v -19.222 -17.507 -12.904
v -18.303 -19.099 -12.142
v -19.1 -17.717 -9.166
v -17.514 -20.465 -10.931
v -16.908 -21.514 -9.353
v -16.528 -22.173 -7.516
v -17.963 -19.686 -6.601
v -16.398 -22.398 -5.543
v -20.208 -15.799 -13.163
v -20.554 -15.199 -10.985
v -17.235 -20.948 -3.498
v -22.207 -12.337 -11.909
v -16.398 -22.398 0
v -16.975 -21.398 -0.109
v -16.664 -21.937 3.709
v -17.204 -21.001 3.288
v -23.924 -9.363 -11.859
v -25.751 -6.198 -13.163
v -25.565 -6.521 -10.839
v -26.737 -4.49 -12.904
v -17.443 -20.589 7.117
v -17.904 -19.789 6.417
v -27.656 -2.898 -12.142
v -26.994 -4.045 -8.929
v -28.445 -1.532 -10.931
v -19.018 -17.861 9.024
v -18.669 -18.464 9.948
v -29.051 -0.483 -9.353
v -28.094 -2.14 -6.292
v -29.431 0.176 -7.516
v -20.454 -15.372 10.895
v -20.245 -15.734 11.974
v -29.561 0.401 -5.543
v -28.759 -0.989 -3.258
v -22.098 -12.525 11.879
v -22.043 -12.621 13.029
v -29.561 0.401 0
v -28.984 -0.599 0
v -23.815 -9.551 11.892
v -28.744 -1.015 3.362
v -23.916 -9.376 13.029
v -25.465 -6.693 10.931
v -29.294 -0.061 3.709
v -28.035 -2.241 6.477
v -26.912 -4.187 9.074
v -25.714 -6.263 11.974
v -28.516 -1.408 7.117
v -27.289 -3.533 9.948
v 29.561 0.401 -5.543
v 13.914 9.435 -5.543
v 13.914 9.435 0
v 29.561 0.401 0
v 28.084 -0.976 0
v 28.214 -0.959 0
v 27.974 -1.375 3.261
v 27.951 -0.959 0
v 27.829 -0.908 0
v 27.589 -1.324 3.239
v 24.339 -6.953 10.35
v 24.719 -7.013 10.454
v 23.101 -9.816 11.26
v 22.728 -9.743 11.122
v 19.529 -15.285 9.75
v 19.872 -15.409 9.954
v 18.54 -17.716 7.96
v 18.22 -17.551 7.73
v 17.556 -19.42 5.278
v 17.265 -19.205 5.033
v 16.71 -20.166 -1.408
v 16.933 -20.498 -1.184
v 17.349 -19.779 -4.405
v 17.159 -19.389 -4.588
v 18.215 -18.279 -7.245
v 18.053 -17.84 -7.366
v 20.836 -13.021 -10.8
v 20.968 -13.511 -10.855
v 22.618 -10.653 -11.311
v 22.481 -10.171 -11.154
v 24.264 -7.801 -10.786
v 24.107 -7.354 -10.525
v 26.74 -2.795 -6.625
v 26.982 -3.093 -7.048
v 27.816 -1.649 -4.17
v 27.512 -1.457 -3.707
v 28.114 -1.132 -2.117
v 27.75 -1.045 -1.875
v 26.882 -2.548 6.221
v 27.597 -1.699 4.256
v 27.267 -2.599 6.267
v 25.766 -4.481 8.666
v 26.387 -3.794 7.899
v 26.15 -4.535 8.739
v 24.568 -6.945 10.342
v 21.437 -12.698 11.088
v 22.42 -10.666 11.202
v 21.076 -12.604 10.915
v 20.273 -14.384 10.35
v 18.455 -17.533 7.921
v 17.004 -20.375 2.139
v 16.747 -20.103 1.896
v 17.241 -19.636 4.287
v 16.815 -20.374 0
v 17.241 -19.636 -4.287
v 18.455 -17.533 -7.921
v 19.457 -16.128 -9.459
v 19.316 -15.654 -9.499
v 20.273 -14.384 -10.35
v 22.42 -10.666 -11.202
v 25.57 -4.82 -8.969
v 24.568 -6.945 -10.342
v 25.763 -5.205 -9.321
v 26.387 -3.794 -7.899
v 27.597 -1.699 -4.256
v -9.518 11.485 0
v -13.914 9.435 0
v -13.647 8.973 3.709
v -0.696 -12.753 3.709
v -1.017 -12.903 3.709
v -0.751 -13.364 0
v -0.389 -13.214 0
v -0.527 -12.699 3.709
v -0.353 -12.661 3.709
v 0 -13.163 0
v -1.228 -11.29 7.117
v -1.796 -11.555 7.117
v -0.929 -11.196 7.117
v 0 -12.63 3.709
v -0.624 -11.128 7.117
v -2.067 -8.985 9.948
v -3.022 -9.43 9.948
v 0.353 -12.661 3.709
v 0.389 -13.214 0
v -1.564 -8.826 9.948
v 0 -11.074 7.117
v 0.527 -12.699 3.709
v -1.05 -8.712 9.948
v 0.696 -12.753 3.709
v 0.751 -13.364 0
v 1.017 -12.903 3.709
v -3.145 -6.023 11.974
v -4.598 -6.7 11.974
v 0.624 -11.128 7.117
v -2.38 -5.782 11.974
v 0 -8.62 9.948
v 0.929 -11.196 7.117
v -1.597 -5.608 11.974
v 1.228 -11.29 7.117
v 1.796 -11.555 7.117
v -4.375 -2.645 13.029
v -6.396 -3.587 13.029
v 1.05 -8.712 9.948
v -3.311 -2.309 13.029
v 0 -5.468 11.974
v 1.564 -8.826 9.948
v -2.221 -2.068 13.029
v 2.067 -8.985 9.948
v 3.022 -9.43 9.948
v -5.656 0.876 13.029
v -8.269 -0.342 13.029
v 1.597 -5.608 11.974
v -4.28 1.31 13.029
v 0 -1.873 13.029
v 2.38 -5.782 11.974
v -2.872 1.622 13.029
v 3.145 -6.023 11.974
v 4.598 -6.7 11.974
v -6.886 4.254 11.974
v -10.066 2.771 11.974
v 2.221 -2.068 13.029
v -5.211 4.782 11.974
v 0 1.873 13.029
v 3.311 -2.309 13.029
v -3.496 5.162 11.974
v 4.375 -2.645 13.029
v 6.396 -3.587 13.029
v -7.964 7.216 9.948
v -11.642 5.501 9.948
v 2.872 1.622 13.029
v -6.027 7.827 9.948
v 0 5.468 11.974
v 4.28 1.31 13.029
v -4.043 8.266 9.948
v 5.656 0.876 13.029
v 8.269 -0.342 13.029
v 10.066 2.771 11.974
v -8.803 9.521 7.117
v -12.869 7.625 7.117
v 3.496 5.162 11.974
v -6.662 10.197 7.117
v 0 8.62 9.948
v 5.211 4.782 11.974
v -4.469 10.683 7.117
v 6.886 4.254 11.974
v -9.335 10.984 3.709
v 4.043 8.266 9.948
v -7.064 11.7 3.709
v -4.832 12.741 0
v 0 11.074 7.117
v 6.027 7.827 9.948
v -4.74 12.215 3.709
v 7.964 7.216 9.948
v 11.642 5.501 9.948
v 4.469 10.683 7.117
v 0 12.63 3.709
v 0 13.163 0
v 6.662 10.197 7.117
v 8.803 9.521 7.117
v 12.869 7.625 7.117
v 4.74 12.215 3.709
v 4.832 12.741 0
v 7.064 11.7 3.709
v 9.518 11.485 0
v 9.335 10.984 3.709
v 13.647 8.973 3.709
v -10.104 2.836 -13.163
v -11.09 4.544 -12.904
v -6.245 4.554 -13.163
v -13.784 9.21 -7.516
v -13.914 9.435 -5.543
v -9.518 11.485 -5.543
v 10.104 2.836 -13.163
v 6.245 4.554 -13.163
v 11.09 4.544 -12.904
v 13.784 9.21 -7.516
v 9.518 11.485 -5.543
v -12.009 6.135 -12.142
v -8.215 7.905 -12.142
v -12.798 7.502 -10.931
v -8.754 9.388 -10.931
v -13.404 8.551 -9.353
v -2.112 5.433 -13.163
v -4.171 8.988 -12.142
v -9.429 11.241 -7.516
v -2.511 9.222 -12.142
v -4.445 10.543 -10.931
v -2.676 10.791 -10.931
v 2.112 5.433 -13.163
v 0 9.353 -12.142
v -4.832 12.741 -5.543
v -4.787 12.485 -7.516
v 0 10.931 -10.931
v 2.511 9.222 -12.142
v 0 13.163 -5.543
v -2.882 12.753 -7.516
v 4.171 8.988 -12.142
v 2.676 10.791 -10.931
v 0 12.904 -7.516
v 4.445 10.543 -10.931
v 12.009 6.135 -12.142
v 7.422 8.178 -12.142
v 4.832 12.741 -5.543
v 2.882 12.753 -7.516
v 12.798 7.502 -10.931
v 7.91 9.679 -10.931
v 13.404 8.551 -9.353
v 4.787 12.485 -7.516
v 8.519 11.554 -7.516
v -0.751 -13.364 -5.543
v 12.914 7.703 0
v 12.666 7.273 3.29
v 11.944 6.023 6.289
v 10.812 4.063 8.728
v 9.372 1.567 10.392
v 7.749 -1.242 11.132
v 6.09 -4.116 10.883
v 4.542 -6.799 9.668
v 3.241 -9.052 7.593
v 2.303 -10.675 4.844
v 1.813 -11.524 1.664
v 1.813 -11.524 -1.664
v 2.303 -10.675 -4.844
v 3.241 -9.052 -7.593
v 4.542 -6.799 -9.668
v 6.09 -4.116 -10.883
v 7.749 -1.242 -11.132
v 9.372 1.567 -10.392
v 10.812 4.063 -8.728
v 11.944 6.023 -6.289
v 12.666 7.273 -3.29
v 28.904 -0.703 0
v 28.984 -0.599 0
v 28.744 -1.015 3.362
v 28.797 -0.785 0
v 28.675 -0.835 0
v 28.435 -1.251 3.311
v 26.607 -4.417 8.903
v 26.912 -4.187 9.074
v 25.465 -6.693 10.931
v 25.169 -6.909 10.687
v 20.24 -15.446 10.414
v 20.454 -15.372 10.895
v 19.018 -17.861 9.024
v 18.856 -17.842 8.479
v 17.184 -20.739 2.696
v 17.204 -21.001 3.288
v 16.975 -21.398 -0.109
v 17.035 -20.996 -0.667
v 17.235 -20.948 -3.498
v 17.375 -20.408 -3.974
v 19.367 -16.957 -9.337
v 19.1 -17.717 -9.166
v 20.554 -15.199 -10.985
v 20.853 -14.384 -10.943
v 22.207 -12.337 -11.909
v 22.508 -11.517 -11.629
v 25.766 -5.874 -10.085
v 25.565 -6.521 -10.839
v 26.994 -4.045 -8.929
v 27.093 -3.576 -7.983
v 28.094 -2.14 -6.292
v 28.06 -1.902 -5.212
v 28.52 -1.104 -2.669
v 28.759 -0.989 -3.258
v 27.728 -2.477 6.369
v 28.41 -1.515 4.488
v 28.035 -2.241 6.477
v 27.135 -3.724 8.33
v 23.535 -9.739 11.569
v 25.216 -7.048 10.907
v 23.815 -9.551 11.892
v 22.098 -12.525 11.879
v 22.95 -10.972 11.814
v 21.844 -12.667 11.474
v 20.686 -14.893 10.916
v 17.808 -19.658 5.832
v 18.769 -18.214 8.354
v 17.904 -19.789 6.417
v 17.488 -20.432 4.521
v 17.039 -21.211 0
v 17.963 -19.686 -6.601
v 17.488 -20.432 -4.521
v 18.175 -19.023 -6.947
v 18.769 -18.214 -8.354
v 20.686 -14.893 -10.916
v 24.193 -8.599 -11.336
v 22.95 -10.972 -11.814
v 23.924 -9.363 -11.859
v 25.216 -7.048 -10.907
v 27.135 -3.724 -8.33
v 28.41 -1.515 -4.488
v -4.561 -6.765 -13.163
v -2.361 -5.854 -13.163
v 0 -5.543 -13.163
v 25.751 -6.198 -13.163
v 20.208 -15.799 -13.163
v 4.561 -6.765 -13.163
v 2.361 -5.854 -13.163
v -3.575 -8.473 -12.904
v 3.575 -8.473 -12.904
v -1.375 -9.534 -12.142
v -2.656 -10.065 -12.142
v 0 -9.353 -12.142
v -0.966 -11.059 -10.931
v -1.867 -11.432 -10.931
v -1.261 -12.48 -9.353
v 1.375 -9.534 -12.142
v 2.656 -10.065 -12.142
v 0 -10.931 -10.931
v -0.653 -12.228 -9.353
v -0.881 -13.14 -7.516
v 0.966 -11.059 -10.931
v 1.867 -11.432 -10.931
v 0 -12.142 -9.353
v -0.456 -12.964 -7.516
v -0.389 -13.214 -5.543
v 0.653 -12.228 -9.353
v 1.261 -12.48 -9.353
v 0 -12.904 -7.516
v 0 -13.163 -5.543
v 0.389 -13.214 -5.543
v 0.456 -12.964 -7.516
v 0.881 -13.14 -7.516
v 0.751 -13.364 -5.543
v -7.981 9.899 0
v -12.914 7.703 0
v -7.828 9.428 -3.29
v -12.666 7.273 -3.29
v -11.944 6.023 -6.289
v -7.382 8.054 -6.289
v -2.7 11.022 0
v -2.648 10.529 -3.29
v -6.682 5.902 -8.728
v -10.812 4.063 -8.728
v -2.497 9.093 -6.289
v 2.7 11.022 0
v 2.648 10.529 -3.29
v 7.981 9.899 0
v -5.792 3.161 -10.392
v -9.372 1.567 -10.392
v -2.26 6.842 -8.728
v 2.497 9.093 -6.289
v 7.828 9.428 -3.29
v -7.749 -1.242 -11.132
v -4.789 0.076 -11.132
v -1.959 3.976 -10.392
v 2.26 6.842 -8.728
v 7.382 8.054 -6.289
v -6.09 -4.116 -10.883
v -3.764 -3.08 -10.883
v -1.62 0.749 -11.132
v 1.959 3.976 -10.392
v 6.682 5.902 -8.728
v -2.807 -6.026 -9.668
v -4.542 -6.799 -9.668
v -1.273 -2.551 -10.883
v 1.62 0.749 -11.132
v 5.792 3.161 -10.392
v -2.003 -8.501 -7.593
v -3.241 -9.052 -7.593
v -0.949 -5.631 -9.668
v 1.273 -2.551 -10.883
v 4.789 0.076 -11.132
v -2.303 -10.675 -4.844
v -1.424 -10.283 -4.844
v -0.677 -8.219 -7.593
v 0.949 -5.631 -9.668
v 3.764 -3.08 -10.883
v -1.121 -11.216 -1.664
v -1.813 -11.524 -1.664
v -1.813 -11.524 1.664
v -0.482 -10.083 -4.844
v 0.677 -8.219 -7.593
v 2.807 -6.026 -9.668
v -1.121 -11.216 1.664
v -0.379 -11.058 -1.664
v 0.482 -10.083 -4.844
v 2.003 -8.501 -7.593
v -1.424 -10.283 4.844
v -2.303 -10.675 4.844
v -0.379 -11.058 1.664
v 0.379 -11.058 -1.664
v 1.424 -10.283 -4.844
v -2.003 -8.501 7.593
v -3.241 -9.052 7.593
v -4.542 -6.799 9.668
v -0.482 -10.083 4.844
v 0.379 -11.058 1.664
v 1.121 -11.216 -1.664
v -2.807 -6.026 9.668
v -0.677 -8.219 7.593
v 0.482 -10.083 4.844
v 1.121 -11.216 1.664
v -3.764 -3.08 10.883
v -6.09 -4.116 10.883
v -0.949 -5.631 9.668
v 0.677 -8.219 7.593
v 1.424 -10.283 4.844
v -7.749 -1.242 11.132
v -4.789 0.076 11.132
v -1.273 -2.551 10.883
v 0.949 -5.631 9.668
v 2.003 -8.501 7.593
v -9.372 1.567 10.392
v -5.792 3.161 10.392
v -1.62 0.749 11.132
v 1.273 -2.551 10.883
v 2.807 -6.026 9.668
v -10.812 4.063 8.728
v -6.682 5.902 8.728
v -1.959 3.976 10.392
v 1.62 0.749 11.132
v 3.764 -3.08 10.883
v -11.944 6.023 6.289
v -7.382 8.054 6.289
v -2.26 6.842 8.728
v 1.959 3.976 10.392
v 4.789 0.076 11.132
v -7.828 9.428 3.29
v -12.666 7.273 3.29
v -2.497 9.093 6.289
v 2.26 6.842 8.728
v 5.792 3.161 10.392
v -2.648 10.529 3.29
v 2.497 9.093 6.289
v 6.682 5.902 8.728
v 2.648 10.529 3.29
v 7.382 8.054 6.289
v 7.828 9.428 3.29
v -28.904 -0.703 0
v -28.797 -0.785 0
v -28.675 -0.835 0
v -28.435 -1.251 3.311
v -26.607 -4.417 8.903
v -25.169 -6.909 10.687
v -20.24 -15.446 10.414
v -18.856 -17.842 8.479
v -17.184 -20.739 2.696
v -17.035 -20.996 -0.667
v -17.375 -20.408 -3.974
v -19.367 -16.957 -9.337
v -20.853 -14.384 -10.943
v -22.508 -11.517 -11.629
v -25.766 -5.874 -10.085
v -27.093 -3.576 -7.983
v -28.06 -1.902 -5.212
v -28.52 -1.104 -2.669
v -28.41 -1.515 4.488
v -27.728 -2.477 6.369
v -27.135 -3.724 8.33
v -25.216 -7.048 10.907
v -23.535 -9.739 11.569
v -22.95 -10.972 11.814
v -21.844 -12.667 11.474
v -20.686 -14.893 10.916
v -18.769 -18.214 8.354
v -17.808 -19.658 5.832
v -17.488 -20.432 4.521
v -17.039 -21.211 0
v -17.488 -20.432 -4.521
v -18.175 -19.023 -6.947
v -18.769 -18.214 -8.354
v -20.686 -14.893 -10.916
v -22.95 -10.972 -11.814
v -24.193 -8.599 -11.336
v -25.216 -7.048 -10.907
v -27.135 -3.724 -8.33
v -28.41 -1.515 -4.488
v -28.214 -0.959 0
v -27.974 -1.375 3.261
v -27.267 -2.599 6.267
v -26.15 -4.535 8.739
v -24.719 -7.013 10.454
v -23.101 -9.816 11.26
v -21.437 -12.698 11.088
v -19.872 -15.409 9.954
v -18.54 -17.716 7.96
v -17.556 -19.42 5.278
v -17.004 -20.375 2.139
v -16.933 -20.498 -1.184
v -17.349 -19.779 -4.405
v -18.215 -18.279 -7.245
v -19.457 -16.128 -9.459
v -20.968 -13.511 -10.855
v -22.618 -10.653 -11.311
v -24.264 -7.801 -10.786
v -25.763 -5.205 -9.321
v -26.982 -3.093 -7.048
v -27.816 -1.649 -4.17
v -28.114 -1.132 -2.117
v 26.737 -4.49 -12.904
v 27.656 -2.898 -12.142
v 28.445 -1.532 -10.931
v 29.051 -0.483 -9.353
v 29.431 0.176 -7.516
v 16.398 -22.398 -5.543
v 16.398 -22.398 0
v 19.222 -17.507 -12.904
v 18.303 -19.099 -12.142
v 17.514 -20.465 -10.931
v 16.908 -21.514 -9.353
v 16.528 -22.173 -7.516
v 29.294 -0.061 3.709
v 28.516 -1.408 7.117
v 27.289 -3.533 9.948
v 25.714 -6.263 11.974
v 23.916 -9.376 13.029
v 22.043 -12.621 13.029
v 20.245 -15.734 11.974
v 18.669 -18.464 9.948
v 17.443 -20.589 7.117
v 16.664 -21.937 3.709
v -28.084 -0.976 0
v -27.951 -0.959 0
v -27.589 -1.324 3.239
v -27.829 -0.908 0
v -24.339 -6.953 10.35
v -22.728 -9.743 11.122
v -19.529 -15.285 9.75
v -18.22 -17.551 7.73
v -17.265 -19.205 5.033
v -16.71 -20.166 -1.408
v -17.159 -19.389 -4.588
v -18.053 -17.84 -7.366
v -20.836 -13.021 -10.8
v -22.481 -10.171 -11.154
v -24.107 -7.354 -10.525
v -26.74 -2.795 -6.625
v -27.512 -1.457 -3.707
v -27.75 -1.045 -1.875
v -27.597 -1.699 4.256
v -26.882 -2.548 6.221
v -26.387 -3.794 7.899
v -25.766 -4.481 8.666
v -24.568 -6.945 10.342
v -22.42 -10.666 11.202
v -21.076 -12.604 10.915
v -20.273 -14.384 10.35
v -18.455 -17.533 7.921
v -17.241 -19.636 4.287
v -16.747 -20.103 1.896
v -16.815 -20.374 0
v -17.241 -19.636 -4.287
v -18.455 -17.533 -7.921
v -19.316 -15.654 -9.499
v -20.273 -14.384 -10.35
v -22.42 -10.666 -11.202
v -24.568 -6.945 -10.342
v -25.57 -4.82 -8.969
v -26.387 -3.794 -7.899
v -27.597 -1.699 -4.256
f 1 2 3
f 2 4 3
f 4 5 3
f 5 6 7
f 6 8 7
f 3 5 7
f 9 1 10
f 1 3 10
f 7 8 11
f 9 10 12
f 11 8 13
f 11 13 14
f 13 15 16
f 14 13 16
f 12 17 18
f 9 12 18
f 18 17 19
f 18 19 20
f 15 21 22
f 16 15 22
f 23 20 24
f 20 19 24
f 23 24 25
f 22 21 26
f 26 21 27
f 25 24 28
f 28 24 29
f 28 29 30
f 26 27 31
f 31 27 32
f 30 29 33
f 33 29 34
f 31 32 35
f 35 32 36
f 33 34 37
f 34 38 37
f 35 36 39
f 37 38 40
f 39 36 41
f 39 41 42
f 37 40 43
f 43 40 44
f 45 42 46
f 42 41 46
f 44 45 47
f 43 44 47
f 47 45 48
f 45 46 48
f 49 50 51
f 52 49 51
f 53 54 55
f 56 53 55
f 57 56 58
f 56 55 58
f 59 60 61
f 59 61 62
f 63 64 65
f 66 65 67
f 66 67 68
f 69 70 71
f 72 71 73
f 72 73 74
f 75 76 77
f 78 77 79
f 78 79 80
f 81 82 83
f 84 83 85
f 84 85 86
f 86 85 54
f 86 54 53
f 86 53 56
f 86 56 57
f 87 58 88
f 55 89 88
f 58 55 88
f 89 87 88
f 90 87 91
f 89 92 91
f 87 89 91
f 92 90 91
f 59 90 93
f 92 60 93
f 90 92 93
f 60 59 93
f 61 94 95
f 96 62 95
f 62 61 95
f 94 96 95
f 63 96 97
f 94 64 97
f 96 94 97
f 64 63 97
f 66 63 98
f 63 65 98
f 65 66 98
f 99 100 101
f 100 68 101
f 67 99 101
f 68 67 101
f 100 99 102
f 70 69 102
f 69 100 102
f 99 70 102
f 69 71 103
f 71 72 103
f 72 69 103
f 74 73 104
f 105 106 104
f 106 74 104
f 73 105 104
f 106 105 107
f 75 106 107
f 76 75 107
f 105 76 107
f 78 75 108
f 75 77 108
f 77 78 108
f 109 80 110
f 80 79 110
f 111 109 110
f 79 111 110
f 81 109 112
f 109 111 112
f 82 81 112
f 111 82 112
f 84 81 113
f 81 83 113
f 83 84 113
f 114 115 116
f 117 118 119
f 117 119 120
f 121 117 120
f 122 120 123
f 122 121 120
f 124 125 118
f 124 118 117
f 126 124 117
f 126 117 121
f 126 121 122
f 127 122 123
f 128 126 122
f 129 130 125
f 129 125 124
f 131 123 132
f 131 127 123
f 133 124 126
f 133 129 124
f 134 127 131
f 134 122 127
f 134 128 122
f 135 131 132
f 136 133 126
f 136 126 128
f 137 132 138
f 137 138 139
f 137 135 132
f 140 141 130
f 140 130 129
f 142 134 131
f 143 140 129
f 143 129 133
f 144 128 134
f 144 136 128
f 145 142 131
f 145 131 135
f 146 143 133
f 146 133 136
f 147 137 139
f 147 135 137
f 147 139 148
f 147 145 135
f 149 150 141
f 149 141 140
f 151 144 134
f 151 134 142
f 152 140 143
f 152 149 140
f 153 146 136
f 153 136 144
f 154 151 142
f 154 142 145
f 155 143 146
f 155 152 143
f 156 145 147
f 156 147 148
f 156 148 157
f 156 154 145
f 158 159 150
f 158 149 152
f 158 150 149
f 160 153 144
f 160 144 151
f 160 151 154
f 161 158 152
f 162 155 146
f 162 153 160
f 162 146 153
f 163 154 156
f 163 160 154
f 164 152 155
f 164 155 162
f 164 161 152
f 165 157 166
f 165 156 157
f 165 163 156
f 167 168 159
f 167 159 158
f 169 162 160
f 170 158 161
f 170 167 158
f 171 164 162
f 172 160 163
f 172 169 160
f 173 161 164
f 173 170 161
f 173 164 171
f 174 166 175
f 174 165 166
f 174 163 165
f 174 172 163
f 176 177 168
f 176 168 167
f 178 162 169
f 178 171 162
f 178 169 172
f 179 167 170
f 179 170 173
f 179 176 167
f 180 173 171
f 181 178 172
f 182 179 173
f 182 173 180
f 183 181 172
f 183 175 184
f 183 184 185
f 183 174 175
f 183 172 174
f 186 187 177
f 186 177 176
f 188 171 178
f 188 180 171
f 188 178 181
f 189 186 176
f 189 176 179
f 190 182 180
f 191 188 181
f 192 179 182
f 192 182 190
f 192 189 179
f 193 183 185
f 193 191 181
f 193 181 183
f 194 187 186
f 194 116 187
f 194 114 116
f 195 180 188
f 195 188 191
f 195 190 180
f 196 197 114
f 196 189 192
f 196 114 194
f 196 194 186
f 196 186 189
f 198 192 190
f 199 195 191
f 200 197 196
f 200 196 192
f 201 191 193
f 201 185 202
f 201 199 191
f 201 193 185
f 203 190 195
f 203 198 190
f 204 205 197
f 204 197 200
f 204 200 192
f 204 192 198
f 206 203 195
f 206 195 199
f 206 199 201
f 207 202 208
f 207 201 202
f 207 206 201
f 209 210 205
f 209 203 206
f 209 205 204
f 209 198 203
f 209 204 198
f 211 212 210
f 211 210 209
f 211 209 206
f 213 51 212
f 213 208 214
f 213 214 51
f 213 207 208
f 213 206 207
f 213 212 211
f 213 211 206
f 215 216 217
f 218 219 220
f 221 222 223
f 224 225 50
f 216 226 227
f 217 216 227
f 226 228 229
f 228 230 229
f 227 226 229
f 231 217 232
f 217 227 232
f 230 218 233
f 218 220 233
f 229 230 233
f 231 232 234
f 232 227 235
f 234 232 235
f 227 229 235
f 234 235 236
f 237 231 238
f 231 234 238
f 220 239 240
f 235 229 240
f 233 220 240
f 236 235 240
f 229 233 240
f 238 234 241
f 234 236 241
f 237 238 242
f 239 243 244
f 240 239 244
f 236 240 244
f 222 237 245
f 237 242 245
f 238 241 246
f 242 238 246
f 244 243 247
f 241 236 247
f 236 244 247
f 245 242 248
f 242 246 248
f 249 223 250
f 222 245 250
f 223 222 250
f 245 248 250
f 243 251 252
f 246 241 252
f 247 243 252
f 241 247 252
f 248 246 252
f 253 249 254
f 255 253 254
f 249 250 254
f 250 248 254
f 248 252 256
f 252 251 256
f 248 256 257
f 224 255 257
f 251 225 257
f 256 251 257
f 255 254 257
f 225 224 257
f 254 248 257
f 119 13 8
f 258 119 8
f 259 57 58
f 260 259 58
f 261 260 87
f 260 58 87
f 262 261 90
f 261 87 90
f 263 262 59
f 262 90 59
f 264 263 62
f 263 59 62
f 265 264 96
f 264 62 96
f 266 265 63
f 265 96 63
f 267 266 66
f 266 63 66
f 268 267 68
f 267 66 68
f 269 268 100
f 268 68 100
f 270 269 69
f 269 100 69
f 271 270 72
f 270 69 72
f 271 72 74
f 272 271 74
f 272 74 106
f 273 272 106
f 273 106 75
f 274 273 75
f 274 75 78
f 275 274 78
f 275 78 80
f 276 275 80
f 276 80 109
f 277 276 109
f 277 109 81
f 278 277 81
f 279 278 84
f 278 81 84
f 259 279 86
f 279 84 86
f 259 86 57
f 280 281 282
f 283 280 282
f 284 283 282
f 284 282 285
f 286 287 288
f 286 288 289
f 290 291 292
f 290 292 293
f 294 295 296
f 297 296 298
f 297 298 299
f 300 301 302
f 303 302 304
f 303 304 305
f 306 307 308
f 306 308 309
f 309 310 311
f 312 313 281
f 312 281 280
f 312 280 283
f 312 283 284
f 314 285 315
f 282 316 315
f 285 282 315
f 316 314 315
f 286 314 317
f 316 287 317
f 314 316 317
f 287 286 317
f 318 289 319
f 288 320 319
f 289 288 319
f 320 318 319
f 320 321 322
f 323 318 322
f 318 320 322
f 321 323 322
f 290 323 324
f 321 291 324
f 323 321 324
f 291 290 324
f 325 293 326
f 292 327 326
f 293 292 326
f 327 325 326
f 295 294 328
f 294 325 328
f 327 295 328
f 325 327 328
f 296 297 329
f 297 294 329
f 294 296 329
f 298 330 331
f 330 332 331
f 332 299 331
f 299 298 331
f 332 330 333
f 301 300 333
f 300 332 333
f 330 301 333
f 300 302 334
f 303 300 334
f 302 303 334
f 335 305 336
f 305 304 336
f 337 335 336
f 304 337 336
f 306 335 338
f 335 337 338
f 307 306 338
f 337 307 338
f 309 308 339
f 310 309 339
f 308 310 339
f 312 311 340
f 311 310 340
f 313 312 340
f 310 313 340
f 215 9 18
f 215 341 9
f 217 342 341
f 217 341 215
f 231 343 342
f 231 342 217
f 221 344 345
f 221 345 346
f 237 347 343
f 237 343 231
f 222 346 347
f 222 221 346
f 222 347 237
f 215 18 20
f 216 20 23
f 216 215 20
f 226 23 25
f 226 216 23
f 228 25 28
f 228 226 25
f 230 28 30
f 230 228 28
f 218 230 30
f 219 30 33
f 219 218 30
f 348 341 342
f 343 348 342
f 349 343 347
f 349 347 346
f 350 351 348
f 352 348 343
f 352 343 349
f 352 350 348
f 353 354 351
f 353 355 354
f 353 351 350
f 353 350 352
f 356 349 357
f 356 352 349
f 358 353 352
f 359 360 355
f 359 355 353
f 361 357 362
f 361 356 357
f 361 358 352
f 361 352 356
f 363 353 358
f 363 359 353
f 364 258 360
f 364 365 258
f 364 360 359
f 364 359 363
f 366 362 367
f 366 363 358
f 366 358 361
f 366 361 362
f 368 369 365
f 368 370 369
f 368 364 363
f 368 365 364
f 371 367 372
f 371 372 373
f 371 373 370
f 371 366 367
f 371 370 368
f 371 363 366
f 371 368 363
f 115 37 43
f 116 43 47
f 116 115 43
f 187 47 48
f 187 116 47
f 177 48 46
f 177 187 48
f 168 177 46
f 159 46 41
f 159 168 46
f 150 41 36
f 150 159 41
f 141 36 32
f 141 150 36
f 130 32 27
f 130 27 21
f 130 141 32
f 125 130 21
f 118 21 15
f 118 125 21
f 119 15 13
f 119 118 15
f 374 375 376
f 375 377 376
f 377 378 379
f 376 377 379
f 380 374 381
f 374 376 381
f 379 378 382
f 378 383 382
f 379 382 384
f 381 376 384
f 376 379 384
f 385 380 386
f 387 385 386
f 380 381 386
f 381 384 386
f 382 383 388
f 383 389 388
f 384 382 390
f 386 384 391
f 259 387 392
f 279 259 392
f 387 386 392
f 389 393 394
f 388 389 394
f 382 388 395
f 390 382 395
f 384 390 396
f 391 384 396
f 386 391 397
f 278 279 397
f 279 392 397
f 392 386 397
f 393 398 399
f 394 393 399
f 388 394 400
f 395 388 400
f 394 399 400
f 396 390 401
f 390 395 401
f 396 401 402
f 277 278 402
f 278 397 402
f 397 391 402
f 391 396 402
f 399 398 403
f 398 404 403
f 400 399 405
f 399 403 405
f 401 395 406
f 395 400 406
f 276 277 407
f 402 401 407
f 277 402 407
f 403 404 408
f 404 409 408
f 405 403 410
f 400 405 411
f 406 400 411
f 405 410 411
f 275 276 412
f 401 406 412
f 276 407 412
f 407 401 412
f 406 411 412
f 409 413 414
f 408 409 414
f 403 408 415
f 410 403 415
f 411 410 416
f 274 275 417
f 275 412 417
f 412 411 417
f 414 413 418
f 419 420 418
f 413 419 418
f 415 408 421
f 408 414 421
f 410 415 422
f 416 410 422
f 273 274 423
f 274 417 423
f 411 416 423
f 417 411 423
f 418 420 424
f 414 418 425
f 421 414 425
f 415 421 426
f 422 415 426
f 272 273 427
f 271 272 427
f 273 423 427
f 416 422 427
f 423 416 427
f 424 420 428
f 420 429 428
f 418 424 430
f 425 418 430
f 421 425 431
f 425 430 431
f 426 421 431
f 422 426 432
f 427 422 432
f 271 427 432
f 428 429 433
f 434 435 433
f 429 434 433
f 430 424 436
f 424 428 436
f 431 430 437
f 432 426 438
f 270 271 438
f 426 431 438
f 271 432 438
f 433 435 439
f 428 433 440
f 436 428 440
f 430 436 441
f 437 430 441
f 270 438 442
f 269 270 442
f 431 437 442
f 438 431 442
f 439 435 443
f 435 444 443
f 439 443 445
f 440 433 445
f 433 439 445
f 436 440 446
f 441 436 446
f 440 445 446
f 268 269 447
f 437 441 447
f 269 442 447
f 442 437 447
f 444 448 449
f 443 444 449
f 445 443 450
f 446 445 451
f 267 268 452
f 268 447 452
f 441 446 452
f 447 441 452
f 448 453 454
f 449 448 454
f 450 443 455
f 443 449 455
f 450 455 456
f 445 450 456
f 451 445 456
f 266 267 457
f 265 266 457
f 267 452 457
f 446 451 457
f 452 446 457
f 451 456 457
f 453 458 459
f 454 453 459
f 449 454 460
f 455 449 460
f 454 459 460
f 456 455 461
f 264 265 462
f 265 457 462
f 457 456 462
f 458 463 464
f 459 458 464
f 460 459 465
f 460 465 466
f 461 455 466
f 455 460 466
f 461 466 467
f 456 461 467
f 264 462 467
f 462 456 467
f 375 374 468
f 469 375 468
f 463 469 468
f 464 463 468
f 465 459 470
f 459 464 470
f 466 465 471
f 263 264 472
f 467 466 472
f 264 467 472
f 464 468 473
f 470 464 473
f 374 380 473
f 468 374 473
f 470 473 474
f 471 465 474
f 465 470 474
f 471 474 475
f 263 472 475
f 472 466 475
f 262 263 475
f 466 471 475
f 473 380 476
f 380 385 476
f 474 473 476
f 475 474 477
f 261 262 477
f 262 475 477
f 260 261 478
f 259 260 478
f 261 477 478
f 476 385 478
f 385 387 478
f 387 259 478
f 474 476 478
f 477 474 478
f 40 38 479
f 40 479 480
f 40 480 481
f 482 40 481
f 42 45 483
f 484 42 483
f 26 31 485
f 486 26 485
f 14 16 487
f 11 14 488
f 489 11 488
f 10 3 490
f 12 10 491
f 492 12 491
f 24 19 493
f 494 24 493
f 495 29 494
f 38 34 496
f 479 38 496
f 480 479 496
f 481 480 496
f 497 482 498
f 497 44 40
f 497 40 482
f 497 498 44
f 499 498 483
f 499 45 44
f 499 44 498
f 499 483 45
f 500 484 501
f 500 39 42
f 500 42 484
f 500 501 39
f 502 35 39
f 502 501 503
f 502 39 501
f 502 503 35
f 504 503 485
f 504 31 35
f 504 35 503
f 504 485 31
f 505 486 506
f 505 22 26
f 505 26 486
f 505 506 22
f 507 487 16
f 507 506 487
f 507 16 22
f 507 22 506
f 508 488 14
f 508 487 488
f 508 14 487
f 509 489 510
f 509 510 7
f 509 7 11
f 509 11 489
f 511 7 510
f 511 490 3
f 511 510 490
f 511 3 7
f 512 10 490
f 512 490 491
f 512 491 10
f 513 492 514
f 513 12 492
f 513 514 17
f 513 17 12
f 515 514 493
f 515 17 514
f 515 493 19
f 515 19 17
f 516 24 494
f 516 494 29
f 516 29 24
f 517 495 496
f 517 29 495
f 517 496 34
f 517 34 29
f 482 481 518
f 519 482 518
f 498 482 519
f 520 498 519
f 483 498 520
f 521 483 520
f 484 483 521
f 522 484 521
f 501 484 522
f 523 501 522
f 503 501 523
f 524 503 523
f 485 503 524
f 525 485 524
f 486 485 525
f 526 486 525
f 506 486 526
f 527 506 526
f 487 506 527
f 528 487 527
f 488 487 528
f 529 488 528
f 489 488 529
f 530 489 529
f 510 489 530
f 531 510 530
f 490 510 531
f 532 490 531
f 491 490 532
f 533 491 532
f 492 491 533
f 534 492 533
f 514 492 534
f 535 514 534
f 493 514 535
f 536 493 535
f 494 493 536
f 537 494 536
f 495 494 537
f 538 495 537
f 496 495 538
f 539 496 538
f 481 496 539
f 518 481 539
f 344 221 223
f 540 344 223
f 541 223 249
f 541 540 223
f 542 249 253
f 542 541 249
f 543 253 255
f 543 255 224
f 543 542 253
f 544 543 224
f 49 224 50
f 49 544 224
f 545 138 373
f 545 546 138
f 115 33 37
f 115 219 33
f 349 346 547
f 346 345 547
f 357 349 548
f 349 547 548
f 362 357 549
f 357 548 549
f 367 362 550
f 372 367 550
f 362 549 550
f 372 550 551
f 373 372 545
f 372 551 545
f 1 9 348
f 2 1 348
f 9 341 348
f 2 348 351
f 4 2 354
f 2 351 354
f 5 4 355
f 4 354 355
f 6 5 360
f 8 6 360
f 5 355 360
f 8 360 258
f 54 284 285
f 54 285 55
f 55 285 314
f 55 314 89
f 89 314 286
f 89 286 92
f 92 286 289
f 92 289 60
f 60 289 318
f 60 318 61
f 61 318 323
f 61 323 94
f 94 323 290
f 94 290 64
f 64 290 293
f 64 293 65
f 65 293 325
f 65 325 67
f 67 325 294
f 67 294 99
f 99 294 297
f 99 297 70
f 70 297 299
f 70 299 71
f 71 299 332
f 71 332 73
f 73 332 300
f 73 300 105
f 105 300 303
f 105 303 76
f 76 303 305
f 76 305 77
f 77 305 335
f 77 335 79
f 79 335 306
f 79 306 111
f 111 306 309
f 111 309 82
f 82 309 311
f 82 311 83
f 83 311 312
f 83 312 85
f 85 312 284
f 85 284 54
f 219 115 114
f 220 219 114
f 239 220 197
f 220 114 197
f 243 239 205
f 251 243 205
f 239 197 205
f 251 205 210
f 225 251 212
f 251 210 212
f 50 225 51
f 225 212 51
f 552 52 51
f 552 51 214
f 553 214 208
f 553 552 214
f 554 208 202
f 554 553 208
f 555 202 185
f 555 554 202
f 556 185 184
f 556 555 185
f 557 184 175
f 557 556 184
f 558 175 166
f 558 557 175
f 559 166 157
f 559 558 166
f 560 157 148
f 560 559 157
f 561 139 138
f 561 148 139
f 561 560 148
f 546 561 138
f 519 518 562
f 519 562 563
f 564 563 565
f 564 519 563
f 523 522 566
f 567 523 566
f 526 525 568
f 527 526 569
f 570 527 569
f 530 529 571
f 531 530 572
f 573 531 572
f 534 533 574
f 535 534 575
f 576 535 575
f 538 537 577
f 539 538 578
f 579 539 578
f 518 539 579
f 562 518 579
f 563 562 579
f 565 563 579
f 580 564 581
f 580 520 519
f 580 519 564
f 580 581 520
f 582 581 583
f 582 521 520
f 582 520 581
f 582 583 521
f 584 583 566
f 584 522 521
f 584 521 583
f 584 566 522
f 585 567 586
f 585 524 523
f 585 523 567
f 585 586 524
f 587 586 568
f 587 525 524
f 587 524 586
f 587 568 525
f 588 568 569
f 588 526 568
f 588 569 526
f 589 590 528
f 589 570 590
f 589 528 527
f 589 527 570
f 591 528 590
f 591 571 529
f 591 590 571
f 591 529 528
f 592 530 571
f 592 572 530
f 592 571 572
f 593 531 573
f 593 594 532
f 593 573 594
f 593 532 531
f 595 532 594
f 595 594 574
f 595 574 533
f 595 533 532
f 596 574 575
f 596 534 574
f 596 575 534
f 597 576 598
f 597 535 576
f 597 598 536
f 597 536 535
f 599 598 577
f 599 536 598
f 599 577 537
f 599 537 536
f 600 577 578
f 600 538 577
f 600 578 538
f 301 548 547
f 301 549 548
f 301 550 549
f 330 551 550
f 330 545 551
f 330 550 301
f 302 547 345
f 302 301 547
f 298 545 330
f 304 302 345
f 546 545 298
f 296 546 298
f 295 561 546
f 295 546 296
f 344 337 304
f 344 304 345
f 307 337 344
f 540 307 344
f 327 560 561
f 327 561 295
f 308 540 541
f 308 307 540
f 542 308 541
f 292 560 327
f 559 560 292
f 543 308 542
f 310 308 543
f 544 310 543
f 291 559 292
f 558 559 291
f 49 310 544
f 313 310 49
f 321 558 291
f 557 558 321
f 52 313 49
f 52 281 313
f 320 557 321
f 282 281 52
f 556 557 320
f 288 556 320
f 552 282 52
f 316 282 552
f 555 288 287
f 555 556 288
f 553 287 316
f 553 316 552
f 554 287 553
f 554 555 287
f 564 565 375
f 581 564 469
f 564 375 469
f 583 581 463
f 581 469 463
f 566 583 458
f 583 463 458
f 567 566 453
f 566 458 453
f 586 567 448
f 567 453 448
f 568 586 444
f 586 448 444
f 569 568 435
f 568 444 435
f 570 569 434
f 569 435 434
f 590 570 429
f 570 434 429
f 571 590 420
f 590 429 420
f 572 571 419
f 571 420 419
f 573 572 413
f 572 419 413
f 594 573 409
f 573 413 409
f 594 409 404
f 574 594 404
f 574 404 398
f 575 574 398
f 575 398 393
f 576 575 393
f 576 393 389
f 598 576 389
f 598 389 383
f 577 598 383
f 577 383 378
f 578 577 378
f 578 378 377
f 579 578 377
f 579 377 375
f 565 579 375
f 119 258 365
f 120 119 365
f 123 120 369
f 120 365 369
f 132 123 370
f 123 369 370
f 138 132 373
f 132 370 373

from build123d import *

# Parameters (mm, degrees)
F1_R    = 11.1633
F3_R    = 7.62
F4_SIZE = 0.635
F5_R    = 0.508


with BuildPart() as f2:
    # F2: sweep along a path in F0
    with BuildLine(Plane.XY) as f2_path:
        Line((-21.9970452561, -12.7), (-6.35, -3.6661742094))
        ThreePointArc((-6.35, -3.6661742094), (0, -1.9646968374), (6.35, -3.6661742094))
        Line((6.35, -3.6661742094), (21.9970452561, -12.7))
    # F1 (on Right) → F2 (sweep)
    with BuildSketch(Plane.YZ):
        with BuildLine():
            ThreePointArc((0, -13.1633), (9.3078586928, -9.3078586928), (13.1633, 0))
            ThreePointArc((13.1633, 0), (0, 13.1633), (-13.1633, 0))
            ThreePointArc((-13.1633, 0), (-9.3078586928, -9.3078586928), (0, -13.1633))
        make_face()
        Circle(F1_R, mode=Mode.SUBTRACT)
        with BuildLine():
            Line((13.1633, -13.1633), (13.1633, 0))
            ThreePointArc((13.1633, 0), (9.3078586928, -9.3078586928), (0, -13.1633))
            Line((0, -13.1633), (13.1633, -13.1633))
        make_face()
        with BuildLine():
            ThreePointArc((0, -13.1633), (-9.3078586928, -9.3078586928), (-13.1633, 0))
            Line((-13.1633, 0), (-13.1633, -13.1633))
            Line((-13.1633, -13.1633), (0, -13.1633))
        make_face()
    sweep(path=f2_path.line)

    # F3
    f3_edges = [f2.edges().sort_by_distance(p)[0] for p in [
        (-8.574221, -17.881362, -13.1633),
        (8.574221, -17.881362, -13.1633),
        (0, -13.1633, -13.1633),
        (21.737521, 4.918142, -13.1633),
        (0, 13.1633, -13.1633),
        (-21.737521, 4.918142, -13.1633),
    ]]
    fillet(f3_edges, radius=F3_R)

    # F4
    f4_edges = [f2.edges().sort_by_distance(p)[0] for p in [
        (17.397744, -20.666224, 0),
        (-17.397744, -20.666224, 0),
    ]]
    chamfer(f4_edges, length=F4_SIZE)

    # F5
    f5_edges = [f2.edges().sort_by_distance(p)[0] for p in [
        (-17.080244, -21.21615, 0),
        (-16.847818, -20.348724, 0),
        (17.080244, -21.21615, 0),
        (16.847818, -20.348724, 0),
    ]]
    fillet(f5_edges, radius=F5_R)


solid = f2.part
